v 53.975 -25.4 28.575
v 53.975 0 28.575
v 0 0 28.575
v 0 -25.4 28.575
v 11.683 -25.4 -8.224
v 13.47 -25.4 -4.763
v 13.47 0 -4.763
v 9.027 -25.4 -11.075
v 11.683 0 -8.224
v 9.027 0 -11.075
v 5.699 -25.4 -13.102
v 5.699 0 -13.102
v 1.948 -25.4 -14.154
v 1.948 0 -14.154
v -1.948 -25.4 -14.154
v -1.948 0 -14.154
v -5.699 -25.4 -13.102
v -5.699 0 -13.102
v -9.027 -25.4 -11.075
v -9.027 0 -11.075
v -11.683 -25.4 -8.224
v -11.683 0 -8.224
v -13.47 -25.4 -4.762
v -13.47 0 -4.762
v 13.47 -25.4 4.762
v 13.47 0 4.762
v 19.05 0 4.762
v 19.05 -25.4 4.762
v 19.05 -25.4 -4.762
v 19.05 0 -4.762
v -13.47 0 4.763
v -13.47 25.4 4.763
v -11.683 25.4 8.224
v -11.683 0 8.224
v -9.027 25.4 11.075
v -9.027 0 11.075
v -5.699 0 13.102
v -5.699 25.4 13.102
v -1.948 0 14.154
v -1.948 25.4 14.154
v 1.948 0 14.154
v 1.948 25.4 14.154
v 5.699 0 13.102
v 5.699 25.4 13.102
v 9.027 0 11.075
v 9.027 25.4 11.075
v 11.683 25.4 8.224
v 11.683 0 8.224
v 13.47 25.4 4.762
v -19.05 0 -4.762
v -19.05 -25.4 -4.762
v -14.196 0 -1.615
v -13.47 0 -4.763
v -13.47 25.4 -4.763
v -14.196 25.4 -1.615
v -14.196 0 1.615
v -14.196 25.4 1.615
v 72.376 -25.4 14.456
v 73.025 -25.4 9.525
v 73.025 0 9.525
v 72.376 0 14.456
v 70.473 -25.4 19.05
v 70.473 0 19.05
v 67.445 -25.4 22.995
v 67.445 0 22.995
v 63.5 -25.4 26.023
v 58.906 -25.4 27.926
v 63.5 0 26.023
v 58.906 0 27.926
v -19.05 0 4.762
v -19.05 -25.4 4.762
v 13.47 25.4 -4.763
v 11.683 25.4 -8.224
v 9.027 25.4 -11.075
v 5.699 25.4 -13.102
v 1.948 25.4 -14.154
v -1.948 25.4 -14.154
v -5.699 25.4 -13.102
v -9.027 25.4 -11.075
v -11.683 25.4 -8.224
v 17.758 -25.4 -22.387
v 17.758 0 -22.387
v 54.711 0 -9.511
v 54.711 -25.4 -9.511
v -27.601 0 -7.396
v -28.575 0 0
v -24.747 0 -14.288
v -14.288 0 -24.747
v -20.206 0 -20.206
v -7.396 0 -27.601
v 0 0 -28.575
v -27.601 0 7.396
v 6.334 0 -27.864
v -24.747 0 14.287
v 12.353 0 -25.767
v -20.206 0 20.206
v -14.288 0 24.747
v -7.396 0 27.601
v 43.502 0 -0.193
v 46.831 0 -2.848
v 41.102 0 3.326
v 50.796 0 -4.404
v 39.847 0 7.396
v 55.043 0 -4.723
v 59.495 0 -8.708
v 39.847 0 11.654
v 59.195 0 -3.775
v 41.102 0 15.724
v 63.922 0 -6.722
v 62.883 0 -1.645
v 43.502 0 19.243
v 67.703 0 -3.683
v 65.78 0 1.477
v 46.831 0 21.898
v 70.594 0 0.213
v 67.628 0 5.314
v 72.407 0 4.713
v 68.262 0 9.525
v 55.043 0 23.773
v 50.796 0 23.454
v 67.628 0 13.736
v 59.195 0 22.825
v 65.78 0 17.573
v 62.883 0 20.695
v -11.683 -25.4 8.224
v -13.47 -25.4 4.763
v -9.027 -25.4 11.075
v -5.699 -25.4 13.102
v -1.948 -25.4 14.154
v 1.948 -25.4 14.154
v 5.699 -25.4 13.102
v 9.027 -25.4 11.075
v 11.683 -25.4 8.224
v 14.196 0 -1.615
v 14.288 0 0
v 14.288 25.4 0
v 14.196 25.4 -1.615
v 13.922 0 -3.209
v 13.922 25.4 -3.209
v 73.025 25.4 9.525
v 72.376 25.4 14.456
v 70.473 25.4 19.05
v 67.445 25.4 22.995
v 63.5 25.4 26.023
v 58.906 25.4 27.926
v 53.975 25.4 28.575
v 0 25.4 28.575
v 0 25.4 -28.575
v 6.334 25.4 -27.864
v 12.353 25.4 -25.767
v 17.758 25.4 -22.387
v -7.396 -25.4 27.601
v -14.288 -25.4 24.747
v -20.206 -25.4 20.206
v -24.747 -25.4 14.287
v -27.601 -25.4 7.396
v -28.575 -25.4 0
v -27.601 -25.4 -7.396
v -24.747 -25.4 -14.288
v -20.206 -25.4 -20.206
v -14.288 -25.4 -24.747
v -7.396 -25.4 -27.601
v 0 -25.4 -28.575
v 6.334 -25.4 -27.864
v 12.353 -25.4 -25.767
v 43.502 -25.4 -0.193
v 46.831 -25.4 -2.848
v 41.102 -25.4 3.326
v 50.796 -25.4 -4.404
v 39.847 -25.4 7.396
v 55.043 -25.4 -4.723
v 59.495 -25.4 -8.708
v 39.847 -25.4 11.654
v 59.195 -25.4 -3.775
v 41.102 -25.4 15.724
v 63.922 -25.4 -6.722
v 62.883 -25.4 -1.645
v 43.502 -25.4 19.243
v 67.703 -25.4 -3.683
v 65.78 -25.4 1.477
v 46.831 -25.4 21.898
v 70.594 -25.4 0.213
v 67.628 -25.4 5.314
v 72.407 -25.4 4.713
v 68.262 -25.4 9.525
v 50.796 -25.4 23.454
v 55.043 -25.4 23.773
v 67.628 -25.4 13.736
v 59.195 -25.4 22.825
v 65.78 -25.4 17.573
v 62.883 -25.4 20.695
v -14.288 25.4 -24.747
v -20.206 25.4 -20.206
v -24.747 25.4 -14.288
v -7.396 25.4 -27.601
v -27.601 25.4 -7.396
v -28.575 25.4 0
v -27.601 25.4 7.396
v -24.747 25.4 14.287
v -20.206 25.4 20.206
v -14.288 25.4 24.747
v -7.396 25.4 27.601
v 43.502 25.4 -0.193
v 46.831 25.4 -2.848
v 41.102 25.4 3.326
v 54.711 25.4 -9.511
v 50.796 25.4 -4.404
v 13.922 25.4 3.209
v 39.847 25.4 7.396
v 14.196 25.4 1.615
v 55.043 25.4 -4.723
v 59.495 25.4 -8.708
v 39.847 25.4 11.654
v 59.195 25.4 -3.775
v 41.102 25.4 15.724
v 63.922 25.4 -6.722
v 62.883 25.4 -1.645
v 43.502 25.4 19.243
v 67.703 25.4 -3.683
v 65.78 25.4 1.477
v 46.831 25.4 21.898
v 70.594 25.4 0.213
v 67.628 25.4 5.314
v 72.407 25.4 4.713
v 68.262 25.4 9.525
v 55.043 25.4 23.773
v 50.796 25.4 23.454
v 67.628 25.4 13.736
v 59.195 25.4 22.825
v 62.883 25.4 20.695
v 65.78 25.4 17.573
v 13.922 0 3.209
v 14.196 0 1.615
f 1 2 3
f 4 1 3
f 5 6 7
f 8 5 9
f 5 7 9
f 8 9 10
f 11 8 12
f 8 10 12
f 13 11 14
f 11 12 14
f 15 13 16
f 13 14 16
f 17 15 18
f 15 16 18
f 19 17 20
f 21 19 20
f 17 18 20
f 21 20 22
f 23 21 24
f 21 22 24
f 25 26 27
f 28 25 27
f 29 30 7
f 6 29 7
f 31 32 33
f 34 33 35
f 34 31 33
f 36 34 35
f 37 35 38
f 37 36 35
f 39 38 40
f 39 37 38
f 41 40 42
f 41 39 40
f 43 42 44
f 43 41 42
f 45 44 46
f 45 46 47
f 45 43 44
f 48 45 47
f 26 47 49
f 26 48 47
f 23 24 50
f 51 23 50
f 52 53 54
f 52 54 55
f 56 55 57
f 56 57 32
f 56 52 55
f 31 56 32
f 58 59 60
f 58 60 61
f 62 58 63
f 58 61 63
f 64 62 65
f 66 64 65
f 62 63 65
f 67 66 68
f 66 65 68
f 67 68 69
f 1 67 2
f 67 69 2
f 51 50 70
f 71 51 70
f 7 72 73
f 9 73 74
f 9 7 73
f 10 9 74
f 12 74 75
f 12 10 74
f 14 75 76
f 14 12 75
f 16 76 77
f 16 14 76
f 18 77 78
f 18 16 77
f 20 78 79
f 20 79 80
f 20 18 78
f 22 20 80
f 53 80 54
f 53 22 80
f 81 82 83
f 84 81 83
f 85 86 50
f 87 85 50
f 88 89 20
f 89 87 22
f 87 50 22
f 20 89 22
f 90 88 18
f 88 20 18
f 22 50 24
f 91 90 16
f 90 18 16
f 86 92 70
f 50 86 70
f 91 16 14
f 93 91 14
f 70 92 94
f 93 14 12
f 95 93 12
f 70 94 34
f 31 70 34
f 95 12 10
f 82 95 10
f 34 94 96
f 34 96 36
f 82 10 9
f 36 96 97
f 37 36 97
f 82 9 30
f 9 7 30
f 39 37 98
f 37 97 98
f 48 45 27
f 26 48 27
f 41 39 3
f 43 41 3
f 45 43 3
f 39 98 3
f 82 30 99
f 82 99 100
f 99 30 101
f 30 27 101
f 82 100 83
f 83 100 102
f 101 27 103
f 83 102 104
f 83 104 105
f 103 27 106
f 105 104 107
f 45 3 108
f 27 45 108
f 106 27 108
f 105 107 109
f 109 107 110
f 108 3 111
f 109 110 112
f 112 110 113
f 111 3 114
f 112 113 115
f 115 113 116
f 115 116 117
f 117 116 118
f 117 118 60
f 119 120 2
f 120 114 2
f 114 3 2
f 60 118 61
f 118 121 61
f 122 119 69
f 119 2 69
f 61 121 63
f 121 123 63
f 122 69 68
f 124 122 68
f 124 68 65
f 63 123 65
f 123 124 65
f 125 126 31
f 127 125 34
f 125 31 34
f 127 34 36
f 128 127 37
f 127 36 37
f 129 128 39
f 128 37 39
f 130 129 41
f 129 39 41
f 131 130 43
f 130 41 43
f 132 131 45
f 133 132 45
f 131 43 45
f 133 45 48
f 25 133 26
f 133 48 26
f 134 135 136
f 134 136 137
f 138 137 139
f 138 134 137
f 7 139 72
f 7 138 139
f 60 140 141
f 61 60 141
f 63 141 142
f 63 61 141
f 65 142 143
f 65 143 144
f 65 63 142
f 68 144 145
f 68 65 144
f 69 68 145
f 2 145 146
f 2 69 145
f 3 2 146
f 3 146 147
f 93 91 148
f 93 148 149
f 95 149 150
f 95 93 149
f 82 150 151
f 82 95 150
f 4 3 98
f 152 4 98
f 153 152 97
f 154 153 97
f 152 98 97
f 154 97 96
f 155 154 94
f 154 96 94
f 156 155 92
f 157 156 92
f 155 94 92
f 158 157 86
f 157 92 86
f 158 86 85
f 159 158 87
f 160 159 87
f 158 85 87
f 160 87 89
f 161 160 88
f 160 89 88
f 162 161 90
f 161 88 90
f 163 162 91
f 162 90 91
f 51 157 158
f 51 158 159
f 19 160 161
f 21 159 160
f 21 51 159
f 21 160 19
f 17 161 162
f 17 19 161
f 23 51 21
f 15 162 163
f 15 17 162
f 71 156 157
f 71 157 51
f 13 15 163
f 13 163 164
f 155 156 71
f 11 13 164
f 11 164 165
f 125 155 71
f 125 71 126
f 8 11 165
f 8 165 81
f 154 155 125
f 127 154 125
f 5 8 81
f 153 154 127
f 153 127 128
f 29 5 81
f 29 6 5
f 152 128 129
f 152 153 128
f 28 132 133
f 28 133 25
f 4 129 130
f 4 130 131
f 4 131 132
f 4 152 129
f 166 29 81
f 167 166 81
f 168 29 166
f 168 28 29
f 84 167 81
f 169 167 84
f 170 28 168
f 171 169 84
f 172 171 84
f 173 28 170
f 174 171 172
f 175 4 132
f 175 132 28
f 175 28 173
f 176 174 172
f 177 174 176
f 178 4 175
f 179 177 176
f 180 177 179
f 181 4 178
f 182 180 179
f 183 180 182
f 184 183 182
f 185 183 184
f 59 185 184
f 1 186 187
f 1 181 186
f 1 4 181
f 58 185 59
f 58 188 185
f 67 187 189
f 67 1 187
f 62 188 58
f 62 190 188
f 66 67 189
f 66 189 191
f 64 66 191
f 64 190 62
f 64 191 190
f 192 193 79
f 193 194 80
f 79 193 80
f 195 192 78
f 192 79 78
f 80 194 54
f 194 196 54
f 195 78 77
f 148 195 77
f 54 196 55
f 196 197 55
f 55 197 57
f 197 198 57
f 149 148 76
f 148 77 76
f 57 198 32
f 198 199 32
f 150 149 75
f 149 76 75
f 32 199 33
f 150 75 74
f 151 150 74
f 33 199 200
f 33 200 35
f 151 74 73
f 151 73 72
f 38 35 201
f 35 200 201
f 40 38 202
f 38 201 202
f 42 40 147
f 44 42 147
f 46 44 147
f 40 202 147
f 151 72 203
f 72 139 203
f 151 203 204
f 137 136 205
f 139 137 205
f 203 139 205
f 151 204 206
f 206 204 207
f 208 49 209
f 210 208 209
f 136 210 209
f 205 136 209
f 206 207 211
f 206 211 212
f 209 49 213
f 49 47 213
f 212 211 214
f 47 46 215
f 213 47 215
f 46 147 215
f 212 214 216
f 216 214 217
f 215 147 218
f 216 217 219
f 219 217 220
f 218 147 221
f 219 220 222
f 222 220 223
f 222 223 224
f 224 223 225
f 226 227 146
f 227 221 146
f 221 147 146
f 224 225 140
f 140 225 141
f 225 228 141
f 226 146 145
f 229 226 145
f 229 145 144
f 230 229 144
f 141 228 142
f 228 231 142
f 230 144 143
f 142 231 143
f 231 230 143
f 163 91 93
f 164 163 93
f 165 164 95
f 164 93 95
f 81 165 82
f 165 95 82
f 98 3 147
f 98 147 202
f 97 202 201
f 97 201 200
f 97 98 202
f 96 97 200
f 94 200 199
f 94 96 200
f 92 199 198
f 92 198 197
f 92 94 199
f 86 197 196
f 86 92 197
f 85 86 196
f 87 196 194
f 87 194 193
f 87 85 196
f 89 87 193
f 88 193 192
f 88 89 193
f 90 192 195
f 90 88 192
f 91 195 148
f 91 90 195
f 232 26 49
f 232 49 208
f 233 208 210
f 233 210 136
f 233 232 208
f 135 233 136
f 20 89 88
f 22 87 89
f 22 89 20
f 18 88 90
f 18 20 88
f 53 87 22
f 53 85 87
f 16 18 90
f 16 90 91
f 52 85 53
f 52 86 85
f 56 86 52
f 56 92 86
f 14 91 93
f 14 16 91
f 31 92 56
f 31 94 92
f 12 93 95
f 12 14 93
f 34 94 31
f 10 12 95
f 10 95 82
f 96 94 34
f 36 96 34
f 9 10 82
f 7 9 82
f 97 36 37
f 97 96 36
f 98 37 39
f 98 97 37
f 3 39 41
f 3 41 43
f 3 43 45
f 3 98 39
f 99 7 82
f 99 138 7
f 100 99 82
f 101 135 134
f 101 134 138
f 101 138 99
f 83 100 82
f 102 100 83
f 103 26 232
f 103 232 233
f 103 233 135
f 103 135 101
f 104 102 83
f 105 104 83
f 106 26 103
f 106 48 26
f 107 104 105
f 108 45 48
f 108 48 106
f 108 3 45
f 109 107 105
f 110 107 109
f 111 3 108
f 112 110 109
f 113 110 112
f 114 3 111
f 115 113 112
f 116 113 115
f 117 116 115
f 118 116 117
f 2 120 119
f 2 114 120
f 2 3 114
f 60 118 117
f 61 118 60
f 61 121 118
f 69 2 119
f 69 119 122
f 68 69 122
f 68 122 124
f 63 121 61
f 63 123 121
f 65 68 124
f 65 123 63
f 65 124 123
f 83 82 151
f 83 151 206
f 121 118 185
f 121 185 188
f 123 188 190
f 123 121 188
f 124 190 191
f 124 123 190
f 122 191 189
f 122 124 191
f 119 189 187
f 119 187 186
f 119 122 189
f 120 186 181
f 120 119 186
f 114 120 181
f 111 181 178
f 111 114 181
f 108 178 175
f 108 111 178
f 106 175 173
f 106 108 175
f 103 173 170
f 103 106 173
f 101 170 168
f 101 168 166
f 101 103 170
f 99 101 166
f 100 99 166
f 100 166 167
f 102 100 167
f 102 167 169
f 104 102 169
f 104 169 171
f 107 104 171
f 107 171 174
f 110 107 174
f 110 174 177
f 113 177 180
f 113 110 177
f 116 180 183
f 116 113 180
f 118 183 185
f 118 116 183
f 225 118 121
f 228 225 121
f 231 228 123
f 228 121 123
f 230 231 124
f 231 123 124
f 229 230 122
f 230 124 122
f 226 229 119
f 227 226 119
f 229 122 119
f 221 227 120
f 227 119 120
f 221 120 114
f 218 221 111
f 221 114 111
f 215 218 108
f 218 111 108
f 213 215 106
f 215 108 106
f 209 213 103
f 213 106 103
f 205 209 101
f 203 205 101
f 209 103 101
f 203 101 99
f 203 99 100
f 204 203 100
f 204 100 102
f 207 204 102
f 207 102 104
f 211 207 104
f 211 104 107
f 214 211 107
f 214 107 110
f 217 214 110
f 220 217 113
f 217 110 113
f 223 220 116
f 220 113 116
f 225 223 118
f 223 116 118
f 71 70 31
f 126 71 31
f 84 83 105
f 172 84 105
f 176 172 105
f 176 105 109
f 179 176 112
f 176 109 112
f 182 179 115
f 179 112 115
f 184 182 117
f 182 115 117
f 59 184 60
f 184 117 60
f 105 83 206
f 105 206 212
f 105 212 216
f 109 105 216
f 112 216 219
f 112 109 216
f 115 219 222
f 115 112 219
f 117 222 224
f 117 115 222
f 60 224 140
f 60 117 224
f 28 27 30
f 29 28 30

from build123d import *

# Parameters (mm, degrees)
F0_R     = 14.2875
F1_DEPTH = 25.4
F2_DEPTH = 25.4


with BuildPart() as f1:
    # F0 (on Front) → F1 (new body)
    with BuildSketch(Plane.XZ):
        with BuildLine():
            ThreePointArc((0, 28.575), (20.2055762724, 20.2055762724), (28.575, 0))
            ThreePointArc((28.575, 0), (25.7290056285, -12.431769559), (17.7579295281, -22.3871964273))
            Line((17.7579295281, -22.3871964273), (54.7110378477, -9.5107754842))
            ThreePointArc((54.7110378477, -9.5107754842), (34.9285564609, 9.1569123575), (53.975, 28.575))
            Line((53.975, 28.575), (0, 28.575))
        make_face()
        with BuildLine():
            ThreePointArc((17.7579295281, -22.3871964273), (25.7290056285, -12.431769559), (28.575, 0))
            ThreePointArc((28.575, 0), (20.2055762724, 20.2055762724), (0, 28.575))
            ThreePointArc((0, 28.575), (-28.575, 0), (0, -28.575))
            Line((0, -28.575), (17.7579295281, -22.3871964273))
        make_face()
        with BuildLine():
            ThreePointArc((-13.4703841816, 4.7625), (0, 14.2875), (13.4703841816, 4.7625))
            Line((13.4703841816, 4.7625), (19.05, 4.7625))
            Line((19.05, 4.7625), (19.05, -4.7625))
            Line((19.05, -4.7625), (13.4703841816, -4.7625))
            ThreePointArc((13.4703841816, -4.7625), (0, -14.2875), (-13.4703841816, -4.7625))
            Line((-13.4703841816, -4.7625), (-19.05, -4.7625))
            Line((-19.05, -4.7625), (-19.05, 4.7625))
            Line((-19.05, 4.7625), (-13.4703841816, 4.7625))
        make_face(mode=Mode.SUBTRACT)
        with BuildLine():
            ThreePointArc((73.025, 9.525), (67.4453841816, 22.9953841816), (53.975, 28.575))
            ThreePointArc((53.975, 28.575), (34.9285564609, 9.1569123575), (54.7110378477, -9.5107754842))
            ThreePointArc((54.7110378477, -9.5107754842), (67.703146652, -3.6825921159), (73.025, 9.525))
        make_face()
        with Locations((53.975, 9.525)):
            Circle(F0_R, mode=Mode.SUBTRACT)
        with BuildLine():
            ThreePointArc((13.4703841816, 4.7625), (14.081739421, 2.416044521), (14.2875, 0))
            ThreePointArc((14.2875, 0), (14.081739421, -2.416044521), (13.4703841816, -4.7625))
            Line((13.4703841816, -4.7625), (19.05, -4.7625))
            Line((19.05, -4.7625), (19.05, 4.7625))
            Line((19.05, 4.7625), (13.4703841816, 4.7625))
        make_face()
        with BuildLine():
            ThreePointArc((-13.4703841816, -4.7625), (-14.2875, 0), (-13.4703841816, 4.7625))
            Line((-13.4703841816, 4.7625), (-19.05, 4.7625))
            Line((-19.05, 4.7625), (-19.05, -4.7625))
            Line((-19.05, -4.7625), (-13.4703841816, -4.7625))
        make_face()
        with BuildLine():
            ThreePointArc((0, -28.575), (9.4025657958, -26.9837429104), (17.7579295281, -22.3871964273))
            Line((17.7579295281, -22.3871964273), (0, -28.575))
        make_face()
    extrude(amount=-F1_DEPTH)


with BuildPart() as f2:
    # F0 (on Front) → F2 (new body)
    with BuildSketch(Plane.XZ):
        with BuildLine():
            ThreePointArc((17.7579295281, -22.3871964273), (25.7290056285, -12.431769559), (28.575, 0))
            ThreePointArc((28.575, 0), (20.2055762724, 20.2055762724), (0, 28.575))
            ThreePointArc((0, 28.575), (-28.575, 0), (0, -28.575))
            Line((0, -28.575), (17.7579295281, -22.3871964273))
        make_face()
        with BuildLine():
            ThreePointArc((-13.4703841816, 4.7625), (0, 14.2875), (13.4703841816, 4.7625))
            Line((13.4703841816, 4.7625), (19.05, 4.7625))
            Line((19.05, 4.7625), (19.05, -4.7625))
            Line((19.05, -4.7625), (13.4703841816, -4.7625))
            ThreePointArc((13.4703841816, -4.7625), (0, -14.2875), (-13.4703841816, -4.7625))
            Line((-13.4703841816, -4.7625), (-19.05, -4.7625))
            Line((-19.05, -4.7625), (-19.05, 4.7625))
            Line((-19.05, 4.7625), (-13.4703841816, 4.7625))
        make_face(mode=Mode.SUBTRACT)
        with BuildLine():
            ThreePointArc((0, 28.575), (20.2055762724, 20.2055762724), (28.575, 0))
            ThreePointArc((28.575, 0), (25.7290056285, -12.431769559), (17.7579295281, -22.3871964273))
            Line((17.7579295281, -22.3871964273), (54.7110378477, -9.5107754842))
            ThreePointArc((54.7110378477, -9.5107754842), (34.9285564609, 9.1569123575), (53.975, 28.575))
            Line((53.975, 28.575), (0, 28.575))
        make_face()
        with BuildLine():
            ThreePointArc((0, -28.575), (9.4025657958, -26.9837429104), (17.7579295281, -22.3871964273))
            Line((17.7579295281, -22.3871964273), (0, -28.575))
        make_face()
        with BuildLine():
            ThreePointArc((73.025, 9.525), (67.4453841816, 22.9953841816), (53.975, 28.575))
            ThreePointArc((53.975, 28.575), (34.9285564609, 9.1569123575), (54.7110378477, -9.5107754842))
            ThreePointArc((54.7110378477, -9.5107754842), (67.703146652, -3.6825921159), (73.025, 9.525))
        make_face()
        with Locations((53.975, 9.525)):
            Circle(F0_R, mode=Mode.SUBTRACT)
    extrude(amount=F2_DEPTH)


solid = Compound([f1.part, f2.part])
